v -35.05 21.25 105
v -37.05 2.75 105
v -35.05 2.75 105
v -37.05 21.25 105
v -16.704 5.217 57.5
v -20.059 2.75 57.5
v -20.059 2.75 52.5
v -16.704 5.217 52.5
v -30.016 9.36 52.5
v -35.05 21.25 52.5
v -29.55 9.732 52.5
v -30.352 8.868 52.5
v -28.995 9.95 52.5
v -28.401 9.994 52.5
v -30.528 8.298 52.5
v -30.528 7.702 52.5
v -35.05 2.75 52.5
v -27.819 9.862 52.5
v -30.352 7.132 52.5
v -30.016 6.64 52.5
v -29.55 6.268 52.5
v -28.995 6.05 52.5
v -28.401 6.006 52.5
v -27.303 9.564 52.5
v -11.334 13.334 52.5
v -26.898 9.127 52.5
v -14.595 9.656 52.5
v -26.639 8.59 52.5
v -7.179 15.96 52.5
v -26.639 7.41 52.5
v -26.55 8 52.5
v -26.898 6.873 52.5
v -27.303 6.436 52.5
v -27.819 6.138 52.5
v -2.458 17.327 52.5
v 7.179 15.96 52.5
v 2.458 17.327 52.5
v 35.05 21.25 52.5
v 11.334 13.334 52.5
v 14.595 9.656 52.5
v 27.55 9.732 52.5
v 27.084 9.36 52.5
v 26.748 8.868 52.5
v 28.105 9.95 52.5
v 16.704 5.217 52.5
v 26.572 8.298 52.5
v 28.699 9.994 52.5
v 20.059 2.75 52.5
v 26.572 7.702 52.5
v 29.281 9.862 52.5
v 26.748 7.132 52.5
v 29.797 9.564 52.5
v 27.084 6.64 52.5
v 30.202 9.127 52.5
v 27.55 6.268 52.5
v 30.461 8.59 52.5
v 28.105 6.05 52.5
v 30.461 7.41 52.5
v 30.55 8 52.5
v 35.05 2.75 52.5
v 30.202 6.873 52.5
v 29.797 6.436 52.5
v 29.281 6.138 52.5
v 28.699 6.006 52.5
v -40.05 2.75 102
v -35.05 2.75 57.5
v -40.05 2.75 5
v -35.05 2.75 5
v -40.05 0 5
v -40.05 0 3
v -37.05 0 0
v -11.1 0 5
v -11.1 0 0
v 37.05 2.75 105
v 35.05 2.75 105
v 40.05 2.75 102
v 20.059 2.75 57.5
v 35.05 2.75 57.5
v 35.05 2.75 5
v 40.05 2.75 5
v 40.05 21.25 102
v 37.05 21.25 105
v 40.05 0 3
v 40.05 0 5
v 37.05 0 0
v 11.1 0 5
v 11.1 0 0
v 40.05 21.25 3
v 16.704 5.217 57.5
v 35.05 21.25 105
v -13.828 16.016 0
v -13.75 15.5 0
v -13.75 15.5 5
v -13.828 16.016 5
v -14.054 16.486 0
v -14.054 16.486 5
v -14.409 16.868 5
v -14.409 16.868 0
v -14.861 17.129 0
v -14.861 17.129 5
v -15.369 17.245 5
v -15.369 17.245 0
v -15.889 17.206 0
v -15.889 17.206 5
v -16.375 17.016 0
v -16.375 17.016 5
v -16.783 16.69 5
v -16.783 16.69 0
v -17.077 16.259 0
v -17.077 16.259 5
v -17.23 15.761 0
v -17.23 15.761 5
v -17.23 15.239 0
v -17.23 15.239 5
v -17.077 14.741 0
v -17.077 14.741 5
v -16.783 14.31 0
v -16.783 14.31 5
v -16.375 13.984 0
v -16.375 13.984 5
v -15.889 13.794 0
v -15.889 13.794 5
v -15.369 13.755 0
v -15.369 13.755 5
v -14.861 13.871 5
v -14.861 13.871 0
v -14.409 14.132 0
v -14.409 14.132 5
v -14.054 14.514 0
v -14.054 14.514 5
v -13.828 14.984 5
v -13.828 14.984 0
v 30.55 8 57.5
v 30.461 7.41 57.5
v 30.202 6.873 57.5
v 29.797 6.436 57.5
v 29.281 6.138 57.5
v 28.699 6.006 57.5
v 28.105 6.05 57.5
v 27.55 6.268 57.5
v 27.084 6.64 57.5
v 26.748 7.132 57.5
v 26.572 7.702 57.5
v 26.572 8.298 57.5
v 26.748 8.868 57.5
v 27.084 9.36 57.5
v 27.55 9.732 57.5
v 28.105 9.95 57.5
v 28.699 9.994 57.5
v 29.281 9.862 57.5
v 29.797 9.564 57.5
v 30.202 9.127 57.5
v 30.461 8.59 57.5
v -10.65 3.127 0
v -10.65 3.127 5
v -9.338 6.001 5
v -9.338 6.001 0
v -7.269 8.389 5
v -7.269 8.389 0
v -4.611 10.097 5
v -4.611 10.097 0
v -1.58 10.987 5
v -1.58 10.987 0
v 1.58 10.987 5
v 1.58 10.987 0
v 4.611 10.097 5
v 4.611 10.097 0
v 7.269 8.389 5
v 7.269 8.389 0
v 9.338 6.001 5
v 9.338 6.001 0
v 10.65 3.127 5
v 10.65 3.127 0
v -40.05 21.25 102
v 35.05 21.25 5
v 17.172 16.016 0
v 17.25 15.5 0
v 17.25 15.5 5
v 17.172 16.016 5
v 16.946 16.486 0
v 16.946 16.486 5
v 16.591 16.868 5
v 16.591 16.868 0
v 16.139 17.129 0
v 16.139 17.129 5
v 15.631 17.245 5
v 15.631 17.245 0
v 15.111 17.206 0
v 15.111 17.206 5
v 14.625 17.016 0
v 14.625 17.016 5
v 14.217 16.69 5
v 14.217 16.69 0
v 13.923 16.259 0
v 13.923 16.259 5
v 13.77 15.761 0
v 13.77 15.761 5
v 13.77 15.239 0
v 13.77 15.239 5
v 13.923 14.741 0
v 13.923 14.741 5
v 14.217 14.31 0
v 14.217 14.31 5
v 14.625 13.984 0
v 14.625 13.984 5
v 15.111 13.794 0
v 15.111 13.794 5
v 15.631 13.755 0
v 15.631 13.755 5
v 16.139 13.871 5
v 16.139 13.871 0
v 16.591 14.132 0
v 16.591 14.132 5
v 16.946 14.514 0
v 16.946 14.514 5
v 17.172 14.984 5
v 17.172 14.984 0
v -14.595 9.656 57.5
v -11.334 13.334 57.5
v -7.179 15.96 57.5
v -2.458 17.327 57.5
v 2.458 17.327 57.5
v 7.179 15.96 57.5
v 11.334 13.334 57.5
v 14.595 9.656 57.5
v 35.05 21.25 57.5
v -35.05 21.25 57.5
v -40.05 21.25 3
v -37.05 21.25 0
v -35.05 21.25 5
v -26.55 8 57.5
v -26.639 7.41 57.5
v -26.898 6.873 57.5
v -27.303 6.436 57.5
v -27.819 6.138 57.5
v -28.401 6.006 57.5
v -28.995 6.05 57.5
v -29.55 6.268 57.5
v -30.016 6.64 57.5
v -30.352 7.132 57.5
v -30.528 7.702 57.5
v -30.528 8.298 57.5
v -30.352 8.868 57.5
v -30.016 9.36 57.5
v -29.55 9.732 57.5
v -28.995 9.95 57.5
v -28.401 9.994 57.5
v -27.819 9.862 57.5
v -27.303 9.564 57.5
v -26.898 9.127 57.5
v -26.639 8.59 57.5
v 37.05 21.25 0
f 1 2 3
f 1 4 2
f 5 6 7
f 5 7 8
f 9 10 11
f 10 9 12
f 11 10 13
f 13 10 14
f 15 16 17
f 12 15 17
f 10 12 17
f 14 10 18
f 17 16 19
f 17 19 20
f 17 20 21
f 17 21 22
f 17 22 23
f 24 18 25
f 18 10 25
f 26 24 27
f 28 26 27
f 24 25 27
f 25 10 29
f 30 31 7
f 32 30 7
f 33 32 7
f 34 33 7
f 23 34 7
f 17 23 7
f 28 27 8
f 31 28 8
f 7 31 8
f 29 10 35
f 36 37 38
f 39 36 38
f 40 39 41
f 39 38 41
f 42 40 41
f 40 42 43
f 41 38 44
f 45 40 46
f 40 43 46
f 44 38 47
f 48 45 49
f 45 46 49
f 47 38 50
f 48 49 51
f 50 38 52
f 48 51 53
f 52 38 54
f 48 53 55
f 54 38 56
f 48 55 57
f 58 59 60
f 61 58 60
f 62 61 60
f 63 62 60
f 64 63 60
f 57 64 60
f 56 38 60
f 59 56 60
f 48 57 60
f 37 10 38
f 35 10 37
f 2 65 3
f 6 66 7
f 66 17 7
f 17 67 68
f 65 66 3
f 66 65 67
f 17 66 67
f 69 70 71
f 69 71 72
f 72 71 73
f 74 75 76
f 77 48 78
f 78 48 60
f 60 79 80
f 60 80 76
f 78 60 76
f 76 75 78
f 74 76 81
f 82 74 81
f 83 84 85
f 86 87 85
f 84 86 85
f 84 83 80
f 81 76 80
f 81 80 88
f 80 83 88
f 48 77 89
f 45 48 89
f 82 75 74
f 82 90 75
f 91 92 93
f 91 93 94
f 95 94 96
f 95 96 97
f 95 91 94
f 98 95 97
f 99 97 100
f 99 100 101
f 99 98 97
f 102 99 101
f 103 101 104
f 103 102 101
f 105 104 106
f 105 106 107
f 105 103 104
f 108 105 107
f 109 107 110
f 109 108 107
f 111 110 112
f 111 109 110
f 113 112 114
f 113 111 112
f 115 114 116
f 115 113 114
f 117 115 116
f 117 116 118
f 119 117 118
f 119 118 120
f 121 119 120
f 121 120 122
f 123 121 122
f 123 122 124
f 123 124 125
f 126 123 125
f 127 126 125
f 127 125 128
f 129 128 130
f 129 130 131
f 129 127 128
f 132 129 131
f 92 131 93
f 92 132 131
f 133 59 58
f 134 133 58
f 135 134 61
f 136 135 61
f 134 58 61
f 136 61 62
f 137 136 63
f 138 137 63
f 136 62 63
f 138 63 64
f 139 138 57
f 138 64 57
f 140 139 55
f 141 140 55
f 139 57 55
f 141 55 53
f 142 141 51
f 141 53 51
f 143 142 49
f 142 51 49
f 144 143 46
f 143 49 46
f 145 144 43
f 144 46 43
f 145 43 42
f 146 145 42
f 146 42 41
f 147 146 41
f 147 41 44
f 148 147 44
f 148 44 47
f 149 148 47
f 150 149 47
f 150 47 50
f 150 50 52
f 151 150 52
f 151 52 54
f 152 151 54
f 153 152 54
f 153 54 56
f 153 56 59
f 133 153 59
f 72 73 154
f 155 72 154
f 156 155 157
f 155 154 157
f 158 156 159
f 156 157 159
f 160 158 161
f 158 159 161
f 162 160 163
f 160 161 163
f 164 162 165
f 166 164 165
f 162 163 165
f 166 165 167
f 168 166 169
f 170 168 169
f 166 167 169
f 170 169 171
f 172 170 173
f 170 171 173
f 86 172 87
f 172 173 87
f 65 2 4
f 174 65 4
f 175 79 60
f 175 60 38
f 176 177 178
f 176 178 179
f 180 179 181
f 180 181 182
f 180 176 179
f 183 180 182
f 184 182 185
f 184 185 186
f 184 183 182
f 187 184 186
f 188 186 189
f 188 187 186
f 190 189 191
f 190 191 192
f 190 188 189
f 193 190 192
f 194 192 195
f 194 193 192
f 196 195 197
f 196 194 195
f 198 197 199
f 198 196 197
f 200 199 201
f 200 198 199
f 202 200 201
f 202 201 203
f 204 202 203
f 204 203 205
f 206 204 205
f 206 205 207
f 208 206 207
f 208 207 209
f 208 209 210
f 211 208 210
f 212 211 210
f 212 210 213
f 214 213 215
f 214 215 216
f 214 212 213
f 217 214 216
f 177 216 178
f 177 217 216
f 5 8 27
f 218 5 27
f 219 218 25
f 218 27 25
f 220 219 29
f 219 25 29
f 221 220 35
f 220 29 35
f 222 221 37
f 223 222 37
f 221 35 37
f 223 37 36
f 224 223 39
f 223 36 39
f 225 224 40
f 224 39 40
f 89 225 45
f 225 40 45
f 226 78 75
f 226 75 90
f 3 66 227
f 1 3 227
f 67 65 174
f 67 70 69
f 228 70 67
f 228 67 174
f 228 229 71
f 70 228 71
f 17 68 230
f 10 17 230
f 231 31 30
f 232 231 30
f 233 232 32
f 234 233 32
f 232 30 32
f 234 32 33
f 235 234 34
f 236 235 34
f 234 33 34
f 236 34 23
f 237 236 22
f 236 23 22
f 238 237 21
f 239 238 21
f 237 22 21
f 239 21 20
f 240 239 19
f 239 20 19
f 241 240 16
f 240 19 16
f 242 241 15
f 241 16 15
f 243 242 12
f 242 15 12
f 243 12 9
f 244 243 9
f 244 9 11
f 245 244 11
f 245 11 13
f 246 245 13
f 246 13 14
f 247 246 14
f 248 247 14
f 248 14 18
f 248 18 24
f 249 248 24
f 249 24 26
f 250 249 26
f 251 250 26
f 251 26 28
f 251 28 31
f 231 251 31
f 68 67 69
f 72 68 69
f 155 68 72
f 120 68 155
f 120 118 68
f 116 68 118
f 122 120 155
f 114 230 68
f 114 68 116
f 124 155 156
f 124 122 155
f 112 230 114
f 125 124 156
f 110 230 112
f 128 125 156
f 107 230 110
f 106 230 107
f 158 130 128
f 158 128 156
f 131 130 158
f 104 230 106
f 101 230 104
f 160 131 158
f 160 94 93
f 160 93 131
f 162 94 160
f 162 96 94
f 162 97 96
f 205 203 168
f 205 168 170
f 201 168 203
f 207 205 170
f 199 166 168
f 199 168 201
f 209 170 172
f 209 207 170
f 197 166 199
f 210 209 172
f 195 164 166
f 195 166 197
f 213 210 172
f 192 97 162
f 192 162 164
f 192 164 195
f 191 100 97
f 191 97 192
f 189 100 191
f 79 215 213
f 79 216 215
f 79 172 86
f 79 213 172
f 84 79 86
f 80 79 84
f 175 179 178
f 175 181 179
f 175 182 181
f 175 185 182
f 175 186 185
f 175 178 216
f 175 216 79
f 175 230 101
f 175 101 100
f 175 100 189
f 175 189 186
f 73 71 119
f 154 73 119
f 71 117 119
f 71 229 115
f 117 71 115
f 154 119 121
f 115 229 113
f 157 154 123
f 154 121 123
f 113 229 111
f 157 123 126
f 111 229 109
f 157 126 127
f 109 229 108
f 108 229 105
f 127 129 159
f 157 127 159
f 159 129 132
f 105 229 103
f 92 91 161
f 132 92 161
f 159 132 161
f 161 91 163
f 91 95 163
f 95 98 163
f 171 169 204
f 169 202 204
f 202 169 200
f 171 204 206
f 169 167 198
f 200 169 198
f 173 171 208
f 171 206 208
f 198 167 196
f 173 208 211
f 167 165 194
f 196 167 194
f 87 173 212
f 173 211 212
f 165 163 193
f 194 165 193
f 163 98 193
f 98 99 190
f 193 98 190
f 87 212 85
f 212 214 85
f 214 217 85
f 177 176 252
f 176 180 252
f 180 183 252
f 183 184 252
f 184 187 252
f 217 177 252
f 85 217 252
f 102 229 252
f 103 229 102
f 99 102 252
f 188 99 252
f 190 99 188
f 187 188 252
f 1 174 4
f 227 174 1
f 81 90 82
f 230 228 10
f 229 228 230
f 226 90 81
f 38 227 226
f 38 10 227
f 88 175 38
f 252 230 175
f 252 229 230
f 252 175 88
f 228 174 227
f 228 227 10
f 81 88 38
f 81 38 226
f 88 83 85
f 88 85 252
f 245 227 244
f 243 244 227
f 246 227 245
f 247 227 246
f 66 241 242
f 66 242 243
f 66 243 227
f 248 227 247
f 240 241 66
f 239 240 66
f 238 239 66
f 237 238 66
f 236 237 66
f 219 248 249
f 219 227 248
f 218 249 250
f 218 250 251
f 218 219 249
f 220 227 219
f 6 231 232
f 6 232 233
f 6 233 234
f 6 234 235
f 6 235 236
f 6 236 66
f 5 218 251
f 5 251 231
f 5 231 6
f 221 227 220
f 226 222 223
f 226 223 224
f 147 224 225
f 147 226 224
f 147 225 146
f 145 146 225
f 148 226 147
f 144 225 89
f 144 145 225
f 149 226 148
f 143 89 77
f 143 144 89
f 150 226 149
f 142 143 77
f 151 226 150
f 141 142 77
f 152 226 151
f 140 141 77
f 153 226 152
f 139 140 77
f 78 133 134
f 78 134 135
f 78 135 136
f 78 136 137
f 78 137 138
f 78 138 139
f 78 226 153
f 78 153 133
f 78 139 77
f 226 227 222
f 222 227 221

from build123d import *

# Parameters (mm, degrees)
F0_R        = 1.75
F1_DEPTH    = 5
F2_W        = 5
F2_H        = 18.5
F3_DEPTH    = 100
F4_W        = 18.5
F4_H        = 5
F5_DEPTH    = 70.1
F6_R        = 17.5
F6_R_2      = 2
F7_DEPTH    = 25
F8_SIZE     = 3
F9_T1_DEPTH = 19.3723210726


# Not quite as in the source:
# - a fillet or chamfer that OpenCascade refuses, or shapes differently, is made with other operations: its cross-section is extruded or revolved along the edge and cut away or added


with BuildPart() as f1:
    # F0 (on Top) → F1 (new body)
    with BuildSketch(Plane.XY):
        with BuildLine():
            ThreePointArc((-11.1, 0), (0, 11.1), (11.1, 0))
            Line((11.1, 0), (40.05, 0))
            Line((40.05, 0), (40.05, 21.25))
            Line((40.05, 21.25), (-40.05, 21.25))
            Line((-40.05, 21.25), (-40.05, 0))
            Line((-40.05, 0), (-11.1, 0))
        make_face()
        with Locations((-15.5, 15.5)):
            Circle(F0_R, mode=Mode.SUBTRACT)
        with Locations((15.5, 15.5)):
            Circle(F0_R, mode=Mode.SUBTRACT)
    extrude(amount=F1_DEPTH)

    # F2 (on face) → F3 (join)
    with BuildSketch(Plane.XY.offset(5)):
        with Locations((-37.55, 12)):
            Rectangle(F2_W, F2_H)
        with Locations((37.55, 12)):
            Rectangle(F2_W, F2_H)
    extrude(amount=F3_DEPTH)

    # F4 (on face) → F5 (join, through all)
    with BuildSketch(Plane(origin=(35.05, 0, 0), x_dir=(0, -1, 0), z_dir=(-1, 0, 0))):
        with Locations((-12, 55)):
            Rectangle(F4_W, F4_H)
    extrude(amount=F5_DEPTH)

    # F6 (on face) → F7 (cut)
    with BuildSketch(Plane(origin=(0, 0, 52.5), x_dir=(1, 0, 0), z_dir=(0, 0, -1))):
        Circle(F6_R)
        with Locations((-28.55, -8)):
            Circle(F6_R_2)
        with Locations((28.55, -8)):
            Circle(F6_R_2)
    extrude(amount=-F7_DEPTH, mode=Mode.SUBTRACT)

    # F8
    f8_edges = [f1.edges().sort_by_distance(p)[0] for p in [
        (-40.05, 10.625, 0),
        (40.05, 10.625, 0),
        (-40.05, 12, 105),
        (40.05, 12, 105),
    ]]
    chamfer(f8_edges, length=F8_SIZE)

    # F9: chamfer of 3 on 2 edges, made by hand

    # F9_s2 → F9_t1 (cut)
    with BuildSketch(Plane.XY.offset(45.3138394637)):
        with BuildLine():
            Line((-20.1561629778, 2.678911963), (-16.6075492446, 5.288253662))
            Line((-16.6075492446, 5.288253662), (-16.5502776109, 5.270366237))
            ThreePointArc((-16.5502776109, 5.270366237), (-16.9692117334, 4.0248544257), (-17.2233233798, 2.7405714286))
            Line((-17.2233233798, 2.7405714286), (-17.2825779327, 2.69))
            ThreePointArc((-17.2825779327, 2.69), (-18.7193704553, 2.69), (-20.1561629778, 2.618911963))
            Line((-20.1561629778, 2.618911963), (-20.1561629778, 2.678911963))
        make_face()
        with BuildLine():
            Line((20.1561629778, 2.678911963), (16.6075492446, 5.288253662))
            Line((16.6075492446, 5.288253662), (16.5502776109, 5.270366237))
            ThreePointArc((16.5502776109, 5.270366237), (16.9692117334, 4.0248544257), (17.2233233798, 2.7405714286))
            Line((17.2233233798, 2.7405714286), (17.2825779327, 2.69))
            ThreePointArc((17.2825779327, 2.69), (18.7193704553, 2.69), (20.1561629778, 2.618911963))
            Line((20.1561629778, 2.618911963), (20.1561629778, 2.678911963))
        make_face()
    extrude(amount=F9_T1_DEPTH, mode=Mode.SUBTRACT)


solid = f1.part
